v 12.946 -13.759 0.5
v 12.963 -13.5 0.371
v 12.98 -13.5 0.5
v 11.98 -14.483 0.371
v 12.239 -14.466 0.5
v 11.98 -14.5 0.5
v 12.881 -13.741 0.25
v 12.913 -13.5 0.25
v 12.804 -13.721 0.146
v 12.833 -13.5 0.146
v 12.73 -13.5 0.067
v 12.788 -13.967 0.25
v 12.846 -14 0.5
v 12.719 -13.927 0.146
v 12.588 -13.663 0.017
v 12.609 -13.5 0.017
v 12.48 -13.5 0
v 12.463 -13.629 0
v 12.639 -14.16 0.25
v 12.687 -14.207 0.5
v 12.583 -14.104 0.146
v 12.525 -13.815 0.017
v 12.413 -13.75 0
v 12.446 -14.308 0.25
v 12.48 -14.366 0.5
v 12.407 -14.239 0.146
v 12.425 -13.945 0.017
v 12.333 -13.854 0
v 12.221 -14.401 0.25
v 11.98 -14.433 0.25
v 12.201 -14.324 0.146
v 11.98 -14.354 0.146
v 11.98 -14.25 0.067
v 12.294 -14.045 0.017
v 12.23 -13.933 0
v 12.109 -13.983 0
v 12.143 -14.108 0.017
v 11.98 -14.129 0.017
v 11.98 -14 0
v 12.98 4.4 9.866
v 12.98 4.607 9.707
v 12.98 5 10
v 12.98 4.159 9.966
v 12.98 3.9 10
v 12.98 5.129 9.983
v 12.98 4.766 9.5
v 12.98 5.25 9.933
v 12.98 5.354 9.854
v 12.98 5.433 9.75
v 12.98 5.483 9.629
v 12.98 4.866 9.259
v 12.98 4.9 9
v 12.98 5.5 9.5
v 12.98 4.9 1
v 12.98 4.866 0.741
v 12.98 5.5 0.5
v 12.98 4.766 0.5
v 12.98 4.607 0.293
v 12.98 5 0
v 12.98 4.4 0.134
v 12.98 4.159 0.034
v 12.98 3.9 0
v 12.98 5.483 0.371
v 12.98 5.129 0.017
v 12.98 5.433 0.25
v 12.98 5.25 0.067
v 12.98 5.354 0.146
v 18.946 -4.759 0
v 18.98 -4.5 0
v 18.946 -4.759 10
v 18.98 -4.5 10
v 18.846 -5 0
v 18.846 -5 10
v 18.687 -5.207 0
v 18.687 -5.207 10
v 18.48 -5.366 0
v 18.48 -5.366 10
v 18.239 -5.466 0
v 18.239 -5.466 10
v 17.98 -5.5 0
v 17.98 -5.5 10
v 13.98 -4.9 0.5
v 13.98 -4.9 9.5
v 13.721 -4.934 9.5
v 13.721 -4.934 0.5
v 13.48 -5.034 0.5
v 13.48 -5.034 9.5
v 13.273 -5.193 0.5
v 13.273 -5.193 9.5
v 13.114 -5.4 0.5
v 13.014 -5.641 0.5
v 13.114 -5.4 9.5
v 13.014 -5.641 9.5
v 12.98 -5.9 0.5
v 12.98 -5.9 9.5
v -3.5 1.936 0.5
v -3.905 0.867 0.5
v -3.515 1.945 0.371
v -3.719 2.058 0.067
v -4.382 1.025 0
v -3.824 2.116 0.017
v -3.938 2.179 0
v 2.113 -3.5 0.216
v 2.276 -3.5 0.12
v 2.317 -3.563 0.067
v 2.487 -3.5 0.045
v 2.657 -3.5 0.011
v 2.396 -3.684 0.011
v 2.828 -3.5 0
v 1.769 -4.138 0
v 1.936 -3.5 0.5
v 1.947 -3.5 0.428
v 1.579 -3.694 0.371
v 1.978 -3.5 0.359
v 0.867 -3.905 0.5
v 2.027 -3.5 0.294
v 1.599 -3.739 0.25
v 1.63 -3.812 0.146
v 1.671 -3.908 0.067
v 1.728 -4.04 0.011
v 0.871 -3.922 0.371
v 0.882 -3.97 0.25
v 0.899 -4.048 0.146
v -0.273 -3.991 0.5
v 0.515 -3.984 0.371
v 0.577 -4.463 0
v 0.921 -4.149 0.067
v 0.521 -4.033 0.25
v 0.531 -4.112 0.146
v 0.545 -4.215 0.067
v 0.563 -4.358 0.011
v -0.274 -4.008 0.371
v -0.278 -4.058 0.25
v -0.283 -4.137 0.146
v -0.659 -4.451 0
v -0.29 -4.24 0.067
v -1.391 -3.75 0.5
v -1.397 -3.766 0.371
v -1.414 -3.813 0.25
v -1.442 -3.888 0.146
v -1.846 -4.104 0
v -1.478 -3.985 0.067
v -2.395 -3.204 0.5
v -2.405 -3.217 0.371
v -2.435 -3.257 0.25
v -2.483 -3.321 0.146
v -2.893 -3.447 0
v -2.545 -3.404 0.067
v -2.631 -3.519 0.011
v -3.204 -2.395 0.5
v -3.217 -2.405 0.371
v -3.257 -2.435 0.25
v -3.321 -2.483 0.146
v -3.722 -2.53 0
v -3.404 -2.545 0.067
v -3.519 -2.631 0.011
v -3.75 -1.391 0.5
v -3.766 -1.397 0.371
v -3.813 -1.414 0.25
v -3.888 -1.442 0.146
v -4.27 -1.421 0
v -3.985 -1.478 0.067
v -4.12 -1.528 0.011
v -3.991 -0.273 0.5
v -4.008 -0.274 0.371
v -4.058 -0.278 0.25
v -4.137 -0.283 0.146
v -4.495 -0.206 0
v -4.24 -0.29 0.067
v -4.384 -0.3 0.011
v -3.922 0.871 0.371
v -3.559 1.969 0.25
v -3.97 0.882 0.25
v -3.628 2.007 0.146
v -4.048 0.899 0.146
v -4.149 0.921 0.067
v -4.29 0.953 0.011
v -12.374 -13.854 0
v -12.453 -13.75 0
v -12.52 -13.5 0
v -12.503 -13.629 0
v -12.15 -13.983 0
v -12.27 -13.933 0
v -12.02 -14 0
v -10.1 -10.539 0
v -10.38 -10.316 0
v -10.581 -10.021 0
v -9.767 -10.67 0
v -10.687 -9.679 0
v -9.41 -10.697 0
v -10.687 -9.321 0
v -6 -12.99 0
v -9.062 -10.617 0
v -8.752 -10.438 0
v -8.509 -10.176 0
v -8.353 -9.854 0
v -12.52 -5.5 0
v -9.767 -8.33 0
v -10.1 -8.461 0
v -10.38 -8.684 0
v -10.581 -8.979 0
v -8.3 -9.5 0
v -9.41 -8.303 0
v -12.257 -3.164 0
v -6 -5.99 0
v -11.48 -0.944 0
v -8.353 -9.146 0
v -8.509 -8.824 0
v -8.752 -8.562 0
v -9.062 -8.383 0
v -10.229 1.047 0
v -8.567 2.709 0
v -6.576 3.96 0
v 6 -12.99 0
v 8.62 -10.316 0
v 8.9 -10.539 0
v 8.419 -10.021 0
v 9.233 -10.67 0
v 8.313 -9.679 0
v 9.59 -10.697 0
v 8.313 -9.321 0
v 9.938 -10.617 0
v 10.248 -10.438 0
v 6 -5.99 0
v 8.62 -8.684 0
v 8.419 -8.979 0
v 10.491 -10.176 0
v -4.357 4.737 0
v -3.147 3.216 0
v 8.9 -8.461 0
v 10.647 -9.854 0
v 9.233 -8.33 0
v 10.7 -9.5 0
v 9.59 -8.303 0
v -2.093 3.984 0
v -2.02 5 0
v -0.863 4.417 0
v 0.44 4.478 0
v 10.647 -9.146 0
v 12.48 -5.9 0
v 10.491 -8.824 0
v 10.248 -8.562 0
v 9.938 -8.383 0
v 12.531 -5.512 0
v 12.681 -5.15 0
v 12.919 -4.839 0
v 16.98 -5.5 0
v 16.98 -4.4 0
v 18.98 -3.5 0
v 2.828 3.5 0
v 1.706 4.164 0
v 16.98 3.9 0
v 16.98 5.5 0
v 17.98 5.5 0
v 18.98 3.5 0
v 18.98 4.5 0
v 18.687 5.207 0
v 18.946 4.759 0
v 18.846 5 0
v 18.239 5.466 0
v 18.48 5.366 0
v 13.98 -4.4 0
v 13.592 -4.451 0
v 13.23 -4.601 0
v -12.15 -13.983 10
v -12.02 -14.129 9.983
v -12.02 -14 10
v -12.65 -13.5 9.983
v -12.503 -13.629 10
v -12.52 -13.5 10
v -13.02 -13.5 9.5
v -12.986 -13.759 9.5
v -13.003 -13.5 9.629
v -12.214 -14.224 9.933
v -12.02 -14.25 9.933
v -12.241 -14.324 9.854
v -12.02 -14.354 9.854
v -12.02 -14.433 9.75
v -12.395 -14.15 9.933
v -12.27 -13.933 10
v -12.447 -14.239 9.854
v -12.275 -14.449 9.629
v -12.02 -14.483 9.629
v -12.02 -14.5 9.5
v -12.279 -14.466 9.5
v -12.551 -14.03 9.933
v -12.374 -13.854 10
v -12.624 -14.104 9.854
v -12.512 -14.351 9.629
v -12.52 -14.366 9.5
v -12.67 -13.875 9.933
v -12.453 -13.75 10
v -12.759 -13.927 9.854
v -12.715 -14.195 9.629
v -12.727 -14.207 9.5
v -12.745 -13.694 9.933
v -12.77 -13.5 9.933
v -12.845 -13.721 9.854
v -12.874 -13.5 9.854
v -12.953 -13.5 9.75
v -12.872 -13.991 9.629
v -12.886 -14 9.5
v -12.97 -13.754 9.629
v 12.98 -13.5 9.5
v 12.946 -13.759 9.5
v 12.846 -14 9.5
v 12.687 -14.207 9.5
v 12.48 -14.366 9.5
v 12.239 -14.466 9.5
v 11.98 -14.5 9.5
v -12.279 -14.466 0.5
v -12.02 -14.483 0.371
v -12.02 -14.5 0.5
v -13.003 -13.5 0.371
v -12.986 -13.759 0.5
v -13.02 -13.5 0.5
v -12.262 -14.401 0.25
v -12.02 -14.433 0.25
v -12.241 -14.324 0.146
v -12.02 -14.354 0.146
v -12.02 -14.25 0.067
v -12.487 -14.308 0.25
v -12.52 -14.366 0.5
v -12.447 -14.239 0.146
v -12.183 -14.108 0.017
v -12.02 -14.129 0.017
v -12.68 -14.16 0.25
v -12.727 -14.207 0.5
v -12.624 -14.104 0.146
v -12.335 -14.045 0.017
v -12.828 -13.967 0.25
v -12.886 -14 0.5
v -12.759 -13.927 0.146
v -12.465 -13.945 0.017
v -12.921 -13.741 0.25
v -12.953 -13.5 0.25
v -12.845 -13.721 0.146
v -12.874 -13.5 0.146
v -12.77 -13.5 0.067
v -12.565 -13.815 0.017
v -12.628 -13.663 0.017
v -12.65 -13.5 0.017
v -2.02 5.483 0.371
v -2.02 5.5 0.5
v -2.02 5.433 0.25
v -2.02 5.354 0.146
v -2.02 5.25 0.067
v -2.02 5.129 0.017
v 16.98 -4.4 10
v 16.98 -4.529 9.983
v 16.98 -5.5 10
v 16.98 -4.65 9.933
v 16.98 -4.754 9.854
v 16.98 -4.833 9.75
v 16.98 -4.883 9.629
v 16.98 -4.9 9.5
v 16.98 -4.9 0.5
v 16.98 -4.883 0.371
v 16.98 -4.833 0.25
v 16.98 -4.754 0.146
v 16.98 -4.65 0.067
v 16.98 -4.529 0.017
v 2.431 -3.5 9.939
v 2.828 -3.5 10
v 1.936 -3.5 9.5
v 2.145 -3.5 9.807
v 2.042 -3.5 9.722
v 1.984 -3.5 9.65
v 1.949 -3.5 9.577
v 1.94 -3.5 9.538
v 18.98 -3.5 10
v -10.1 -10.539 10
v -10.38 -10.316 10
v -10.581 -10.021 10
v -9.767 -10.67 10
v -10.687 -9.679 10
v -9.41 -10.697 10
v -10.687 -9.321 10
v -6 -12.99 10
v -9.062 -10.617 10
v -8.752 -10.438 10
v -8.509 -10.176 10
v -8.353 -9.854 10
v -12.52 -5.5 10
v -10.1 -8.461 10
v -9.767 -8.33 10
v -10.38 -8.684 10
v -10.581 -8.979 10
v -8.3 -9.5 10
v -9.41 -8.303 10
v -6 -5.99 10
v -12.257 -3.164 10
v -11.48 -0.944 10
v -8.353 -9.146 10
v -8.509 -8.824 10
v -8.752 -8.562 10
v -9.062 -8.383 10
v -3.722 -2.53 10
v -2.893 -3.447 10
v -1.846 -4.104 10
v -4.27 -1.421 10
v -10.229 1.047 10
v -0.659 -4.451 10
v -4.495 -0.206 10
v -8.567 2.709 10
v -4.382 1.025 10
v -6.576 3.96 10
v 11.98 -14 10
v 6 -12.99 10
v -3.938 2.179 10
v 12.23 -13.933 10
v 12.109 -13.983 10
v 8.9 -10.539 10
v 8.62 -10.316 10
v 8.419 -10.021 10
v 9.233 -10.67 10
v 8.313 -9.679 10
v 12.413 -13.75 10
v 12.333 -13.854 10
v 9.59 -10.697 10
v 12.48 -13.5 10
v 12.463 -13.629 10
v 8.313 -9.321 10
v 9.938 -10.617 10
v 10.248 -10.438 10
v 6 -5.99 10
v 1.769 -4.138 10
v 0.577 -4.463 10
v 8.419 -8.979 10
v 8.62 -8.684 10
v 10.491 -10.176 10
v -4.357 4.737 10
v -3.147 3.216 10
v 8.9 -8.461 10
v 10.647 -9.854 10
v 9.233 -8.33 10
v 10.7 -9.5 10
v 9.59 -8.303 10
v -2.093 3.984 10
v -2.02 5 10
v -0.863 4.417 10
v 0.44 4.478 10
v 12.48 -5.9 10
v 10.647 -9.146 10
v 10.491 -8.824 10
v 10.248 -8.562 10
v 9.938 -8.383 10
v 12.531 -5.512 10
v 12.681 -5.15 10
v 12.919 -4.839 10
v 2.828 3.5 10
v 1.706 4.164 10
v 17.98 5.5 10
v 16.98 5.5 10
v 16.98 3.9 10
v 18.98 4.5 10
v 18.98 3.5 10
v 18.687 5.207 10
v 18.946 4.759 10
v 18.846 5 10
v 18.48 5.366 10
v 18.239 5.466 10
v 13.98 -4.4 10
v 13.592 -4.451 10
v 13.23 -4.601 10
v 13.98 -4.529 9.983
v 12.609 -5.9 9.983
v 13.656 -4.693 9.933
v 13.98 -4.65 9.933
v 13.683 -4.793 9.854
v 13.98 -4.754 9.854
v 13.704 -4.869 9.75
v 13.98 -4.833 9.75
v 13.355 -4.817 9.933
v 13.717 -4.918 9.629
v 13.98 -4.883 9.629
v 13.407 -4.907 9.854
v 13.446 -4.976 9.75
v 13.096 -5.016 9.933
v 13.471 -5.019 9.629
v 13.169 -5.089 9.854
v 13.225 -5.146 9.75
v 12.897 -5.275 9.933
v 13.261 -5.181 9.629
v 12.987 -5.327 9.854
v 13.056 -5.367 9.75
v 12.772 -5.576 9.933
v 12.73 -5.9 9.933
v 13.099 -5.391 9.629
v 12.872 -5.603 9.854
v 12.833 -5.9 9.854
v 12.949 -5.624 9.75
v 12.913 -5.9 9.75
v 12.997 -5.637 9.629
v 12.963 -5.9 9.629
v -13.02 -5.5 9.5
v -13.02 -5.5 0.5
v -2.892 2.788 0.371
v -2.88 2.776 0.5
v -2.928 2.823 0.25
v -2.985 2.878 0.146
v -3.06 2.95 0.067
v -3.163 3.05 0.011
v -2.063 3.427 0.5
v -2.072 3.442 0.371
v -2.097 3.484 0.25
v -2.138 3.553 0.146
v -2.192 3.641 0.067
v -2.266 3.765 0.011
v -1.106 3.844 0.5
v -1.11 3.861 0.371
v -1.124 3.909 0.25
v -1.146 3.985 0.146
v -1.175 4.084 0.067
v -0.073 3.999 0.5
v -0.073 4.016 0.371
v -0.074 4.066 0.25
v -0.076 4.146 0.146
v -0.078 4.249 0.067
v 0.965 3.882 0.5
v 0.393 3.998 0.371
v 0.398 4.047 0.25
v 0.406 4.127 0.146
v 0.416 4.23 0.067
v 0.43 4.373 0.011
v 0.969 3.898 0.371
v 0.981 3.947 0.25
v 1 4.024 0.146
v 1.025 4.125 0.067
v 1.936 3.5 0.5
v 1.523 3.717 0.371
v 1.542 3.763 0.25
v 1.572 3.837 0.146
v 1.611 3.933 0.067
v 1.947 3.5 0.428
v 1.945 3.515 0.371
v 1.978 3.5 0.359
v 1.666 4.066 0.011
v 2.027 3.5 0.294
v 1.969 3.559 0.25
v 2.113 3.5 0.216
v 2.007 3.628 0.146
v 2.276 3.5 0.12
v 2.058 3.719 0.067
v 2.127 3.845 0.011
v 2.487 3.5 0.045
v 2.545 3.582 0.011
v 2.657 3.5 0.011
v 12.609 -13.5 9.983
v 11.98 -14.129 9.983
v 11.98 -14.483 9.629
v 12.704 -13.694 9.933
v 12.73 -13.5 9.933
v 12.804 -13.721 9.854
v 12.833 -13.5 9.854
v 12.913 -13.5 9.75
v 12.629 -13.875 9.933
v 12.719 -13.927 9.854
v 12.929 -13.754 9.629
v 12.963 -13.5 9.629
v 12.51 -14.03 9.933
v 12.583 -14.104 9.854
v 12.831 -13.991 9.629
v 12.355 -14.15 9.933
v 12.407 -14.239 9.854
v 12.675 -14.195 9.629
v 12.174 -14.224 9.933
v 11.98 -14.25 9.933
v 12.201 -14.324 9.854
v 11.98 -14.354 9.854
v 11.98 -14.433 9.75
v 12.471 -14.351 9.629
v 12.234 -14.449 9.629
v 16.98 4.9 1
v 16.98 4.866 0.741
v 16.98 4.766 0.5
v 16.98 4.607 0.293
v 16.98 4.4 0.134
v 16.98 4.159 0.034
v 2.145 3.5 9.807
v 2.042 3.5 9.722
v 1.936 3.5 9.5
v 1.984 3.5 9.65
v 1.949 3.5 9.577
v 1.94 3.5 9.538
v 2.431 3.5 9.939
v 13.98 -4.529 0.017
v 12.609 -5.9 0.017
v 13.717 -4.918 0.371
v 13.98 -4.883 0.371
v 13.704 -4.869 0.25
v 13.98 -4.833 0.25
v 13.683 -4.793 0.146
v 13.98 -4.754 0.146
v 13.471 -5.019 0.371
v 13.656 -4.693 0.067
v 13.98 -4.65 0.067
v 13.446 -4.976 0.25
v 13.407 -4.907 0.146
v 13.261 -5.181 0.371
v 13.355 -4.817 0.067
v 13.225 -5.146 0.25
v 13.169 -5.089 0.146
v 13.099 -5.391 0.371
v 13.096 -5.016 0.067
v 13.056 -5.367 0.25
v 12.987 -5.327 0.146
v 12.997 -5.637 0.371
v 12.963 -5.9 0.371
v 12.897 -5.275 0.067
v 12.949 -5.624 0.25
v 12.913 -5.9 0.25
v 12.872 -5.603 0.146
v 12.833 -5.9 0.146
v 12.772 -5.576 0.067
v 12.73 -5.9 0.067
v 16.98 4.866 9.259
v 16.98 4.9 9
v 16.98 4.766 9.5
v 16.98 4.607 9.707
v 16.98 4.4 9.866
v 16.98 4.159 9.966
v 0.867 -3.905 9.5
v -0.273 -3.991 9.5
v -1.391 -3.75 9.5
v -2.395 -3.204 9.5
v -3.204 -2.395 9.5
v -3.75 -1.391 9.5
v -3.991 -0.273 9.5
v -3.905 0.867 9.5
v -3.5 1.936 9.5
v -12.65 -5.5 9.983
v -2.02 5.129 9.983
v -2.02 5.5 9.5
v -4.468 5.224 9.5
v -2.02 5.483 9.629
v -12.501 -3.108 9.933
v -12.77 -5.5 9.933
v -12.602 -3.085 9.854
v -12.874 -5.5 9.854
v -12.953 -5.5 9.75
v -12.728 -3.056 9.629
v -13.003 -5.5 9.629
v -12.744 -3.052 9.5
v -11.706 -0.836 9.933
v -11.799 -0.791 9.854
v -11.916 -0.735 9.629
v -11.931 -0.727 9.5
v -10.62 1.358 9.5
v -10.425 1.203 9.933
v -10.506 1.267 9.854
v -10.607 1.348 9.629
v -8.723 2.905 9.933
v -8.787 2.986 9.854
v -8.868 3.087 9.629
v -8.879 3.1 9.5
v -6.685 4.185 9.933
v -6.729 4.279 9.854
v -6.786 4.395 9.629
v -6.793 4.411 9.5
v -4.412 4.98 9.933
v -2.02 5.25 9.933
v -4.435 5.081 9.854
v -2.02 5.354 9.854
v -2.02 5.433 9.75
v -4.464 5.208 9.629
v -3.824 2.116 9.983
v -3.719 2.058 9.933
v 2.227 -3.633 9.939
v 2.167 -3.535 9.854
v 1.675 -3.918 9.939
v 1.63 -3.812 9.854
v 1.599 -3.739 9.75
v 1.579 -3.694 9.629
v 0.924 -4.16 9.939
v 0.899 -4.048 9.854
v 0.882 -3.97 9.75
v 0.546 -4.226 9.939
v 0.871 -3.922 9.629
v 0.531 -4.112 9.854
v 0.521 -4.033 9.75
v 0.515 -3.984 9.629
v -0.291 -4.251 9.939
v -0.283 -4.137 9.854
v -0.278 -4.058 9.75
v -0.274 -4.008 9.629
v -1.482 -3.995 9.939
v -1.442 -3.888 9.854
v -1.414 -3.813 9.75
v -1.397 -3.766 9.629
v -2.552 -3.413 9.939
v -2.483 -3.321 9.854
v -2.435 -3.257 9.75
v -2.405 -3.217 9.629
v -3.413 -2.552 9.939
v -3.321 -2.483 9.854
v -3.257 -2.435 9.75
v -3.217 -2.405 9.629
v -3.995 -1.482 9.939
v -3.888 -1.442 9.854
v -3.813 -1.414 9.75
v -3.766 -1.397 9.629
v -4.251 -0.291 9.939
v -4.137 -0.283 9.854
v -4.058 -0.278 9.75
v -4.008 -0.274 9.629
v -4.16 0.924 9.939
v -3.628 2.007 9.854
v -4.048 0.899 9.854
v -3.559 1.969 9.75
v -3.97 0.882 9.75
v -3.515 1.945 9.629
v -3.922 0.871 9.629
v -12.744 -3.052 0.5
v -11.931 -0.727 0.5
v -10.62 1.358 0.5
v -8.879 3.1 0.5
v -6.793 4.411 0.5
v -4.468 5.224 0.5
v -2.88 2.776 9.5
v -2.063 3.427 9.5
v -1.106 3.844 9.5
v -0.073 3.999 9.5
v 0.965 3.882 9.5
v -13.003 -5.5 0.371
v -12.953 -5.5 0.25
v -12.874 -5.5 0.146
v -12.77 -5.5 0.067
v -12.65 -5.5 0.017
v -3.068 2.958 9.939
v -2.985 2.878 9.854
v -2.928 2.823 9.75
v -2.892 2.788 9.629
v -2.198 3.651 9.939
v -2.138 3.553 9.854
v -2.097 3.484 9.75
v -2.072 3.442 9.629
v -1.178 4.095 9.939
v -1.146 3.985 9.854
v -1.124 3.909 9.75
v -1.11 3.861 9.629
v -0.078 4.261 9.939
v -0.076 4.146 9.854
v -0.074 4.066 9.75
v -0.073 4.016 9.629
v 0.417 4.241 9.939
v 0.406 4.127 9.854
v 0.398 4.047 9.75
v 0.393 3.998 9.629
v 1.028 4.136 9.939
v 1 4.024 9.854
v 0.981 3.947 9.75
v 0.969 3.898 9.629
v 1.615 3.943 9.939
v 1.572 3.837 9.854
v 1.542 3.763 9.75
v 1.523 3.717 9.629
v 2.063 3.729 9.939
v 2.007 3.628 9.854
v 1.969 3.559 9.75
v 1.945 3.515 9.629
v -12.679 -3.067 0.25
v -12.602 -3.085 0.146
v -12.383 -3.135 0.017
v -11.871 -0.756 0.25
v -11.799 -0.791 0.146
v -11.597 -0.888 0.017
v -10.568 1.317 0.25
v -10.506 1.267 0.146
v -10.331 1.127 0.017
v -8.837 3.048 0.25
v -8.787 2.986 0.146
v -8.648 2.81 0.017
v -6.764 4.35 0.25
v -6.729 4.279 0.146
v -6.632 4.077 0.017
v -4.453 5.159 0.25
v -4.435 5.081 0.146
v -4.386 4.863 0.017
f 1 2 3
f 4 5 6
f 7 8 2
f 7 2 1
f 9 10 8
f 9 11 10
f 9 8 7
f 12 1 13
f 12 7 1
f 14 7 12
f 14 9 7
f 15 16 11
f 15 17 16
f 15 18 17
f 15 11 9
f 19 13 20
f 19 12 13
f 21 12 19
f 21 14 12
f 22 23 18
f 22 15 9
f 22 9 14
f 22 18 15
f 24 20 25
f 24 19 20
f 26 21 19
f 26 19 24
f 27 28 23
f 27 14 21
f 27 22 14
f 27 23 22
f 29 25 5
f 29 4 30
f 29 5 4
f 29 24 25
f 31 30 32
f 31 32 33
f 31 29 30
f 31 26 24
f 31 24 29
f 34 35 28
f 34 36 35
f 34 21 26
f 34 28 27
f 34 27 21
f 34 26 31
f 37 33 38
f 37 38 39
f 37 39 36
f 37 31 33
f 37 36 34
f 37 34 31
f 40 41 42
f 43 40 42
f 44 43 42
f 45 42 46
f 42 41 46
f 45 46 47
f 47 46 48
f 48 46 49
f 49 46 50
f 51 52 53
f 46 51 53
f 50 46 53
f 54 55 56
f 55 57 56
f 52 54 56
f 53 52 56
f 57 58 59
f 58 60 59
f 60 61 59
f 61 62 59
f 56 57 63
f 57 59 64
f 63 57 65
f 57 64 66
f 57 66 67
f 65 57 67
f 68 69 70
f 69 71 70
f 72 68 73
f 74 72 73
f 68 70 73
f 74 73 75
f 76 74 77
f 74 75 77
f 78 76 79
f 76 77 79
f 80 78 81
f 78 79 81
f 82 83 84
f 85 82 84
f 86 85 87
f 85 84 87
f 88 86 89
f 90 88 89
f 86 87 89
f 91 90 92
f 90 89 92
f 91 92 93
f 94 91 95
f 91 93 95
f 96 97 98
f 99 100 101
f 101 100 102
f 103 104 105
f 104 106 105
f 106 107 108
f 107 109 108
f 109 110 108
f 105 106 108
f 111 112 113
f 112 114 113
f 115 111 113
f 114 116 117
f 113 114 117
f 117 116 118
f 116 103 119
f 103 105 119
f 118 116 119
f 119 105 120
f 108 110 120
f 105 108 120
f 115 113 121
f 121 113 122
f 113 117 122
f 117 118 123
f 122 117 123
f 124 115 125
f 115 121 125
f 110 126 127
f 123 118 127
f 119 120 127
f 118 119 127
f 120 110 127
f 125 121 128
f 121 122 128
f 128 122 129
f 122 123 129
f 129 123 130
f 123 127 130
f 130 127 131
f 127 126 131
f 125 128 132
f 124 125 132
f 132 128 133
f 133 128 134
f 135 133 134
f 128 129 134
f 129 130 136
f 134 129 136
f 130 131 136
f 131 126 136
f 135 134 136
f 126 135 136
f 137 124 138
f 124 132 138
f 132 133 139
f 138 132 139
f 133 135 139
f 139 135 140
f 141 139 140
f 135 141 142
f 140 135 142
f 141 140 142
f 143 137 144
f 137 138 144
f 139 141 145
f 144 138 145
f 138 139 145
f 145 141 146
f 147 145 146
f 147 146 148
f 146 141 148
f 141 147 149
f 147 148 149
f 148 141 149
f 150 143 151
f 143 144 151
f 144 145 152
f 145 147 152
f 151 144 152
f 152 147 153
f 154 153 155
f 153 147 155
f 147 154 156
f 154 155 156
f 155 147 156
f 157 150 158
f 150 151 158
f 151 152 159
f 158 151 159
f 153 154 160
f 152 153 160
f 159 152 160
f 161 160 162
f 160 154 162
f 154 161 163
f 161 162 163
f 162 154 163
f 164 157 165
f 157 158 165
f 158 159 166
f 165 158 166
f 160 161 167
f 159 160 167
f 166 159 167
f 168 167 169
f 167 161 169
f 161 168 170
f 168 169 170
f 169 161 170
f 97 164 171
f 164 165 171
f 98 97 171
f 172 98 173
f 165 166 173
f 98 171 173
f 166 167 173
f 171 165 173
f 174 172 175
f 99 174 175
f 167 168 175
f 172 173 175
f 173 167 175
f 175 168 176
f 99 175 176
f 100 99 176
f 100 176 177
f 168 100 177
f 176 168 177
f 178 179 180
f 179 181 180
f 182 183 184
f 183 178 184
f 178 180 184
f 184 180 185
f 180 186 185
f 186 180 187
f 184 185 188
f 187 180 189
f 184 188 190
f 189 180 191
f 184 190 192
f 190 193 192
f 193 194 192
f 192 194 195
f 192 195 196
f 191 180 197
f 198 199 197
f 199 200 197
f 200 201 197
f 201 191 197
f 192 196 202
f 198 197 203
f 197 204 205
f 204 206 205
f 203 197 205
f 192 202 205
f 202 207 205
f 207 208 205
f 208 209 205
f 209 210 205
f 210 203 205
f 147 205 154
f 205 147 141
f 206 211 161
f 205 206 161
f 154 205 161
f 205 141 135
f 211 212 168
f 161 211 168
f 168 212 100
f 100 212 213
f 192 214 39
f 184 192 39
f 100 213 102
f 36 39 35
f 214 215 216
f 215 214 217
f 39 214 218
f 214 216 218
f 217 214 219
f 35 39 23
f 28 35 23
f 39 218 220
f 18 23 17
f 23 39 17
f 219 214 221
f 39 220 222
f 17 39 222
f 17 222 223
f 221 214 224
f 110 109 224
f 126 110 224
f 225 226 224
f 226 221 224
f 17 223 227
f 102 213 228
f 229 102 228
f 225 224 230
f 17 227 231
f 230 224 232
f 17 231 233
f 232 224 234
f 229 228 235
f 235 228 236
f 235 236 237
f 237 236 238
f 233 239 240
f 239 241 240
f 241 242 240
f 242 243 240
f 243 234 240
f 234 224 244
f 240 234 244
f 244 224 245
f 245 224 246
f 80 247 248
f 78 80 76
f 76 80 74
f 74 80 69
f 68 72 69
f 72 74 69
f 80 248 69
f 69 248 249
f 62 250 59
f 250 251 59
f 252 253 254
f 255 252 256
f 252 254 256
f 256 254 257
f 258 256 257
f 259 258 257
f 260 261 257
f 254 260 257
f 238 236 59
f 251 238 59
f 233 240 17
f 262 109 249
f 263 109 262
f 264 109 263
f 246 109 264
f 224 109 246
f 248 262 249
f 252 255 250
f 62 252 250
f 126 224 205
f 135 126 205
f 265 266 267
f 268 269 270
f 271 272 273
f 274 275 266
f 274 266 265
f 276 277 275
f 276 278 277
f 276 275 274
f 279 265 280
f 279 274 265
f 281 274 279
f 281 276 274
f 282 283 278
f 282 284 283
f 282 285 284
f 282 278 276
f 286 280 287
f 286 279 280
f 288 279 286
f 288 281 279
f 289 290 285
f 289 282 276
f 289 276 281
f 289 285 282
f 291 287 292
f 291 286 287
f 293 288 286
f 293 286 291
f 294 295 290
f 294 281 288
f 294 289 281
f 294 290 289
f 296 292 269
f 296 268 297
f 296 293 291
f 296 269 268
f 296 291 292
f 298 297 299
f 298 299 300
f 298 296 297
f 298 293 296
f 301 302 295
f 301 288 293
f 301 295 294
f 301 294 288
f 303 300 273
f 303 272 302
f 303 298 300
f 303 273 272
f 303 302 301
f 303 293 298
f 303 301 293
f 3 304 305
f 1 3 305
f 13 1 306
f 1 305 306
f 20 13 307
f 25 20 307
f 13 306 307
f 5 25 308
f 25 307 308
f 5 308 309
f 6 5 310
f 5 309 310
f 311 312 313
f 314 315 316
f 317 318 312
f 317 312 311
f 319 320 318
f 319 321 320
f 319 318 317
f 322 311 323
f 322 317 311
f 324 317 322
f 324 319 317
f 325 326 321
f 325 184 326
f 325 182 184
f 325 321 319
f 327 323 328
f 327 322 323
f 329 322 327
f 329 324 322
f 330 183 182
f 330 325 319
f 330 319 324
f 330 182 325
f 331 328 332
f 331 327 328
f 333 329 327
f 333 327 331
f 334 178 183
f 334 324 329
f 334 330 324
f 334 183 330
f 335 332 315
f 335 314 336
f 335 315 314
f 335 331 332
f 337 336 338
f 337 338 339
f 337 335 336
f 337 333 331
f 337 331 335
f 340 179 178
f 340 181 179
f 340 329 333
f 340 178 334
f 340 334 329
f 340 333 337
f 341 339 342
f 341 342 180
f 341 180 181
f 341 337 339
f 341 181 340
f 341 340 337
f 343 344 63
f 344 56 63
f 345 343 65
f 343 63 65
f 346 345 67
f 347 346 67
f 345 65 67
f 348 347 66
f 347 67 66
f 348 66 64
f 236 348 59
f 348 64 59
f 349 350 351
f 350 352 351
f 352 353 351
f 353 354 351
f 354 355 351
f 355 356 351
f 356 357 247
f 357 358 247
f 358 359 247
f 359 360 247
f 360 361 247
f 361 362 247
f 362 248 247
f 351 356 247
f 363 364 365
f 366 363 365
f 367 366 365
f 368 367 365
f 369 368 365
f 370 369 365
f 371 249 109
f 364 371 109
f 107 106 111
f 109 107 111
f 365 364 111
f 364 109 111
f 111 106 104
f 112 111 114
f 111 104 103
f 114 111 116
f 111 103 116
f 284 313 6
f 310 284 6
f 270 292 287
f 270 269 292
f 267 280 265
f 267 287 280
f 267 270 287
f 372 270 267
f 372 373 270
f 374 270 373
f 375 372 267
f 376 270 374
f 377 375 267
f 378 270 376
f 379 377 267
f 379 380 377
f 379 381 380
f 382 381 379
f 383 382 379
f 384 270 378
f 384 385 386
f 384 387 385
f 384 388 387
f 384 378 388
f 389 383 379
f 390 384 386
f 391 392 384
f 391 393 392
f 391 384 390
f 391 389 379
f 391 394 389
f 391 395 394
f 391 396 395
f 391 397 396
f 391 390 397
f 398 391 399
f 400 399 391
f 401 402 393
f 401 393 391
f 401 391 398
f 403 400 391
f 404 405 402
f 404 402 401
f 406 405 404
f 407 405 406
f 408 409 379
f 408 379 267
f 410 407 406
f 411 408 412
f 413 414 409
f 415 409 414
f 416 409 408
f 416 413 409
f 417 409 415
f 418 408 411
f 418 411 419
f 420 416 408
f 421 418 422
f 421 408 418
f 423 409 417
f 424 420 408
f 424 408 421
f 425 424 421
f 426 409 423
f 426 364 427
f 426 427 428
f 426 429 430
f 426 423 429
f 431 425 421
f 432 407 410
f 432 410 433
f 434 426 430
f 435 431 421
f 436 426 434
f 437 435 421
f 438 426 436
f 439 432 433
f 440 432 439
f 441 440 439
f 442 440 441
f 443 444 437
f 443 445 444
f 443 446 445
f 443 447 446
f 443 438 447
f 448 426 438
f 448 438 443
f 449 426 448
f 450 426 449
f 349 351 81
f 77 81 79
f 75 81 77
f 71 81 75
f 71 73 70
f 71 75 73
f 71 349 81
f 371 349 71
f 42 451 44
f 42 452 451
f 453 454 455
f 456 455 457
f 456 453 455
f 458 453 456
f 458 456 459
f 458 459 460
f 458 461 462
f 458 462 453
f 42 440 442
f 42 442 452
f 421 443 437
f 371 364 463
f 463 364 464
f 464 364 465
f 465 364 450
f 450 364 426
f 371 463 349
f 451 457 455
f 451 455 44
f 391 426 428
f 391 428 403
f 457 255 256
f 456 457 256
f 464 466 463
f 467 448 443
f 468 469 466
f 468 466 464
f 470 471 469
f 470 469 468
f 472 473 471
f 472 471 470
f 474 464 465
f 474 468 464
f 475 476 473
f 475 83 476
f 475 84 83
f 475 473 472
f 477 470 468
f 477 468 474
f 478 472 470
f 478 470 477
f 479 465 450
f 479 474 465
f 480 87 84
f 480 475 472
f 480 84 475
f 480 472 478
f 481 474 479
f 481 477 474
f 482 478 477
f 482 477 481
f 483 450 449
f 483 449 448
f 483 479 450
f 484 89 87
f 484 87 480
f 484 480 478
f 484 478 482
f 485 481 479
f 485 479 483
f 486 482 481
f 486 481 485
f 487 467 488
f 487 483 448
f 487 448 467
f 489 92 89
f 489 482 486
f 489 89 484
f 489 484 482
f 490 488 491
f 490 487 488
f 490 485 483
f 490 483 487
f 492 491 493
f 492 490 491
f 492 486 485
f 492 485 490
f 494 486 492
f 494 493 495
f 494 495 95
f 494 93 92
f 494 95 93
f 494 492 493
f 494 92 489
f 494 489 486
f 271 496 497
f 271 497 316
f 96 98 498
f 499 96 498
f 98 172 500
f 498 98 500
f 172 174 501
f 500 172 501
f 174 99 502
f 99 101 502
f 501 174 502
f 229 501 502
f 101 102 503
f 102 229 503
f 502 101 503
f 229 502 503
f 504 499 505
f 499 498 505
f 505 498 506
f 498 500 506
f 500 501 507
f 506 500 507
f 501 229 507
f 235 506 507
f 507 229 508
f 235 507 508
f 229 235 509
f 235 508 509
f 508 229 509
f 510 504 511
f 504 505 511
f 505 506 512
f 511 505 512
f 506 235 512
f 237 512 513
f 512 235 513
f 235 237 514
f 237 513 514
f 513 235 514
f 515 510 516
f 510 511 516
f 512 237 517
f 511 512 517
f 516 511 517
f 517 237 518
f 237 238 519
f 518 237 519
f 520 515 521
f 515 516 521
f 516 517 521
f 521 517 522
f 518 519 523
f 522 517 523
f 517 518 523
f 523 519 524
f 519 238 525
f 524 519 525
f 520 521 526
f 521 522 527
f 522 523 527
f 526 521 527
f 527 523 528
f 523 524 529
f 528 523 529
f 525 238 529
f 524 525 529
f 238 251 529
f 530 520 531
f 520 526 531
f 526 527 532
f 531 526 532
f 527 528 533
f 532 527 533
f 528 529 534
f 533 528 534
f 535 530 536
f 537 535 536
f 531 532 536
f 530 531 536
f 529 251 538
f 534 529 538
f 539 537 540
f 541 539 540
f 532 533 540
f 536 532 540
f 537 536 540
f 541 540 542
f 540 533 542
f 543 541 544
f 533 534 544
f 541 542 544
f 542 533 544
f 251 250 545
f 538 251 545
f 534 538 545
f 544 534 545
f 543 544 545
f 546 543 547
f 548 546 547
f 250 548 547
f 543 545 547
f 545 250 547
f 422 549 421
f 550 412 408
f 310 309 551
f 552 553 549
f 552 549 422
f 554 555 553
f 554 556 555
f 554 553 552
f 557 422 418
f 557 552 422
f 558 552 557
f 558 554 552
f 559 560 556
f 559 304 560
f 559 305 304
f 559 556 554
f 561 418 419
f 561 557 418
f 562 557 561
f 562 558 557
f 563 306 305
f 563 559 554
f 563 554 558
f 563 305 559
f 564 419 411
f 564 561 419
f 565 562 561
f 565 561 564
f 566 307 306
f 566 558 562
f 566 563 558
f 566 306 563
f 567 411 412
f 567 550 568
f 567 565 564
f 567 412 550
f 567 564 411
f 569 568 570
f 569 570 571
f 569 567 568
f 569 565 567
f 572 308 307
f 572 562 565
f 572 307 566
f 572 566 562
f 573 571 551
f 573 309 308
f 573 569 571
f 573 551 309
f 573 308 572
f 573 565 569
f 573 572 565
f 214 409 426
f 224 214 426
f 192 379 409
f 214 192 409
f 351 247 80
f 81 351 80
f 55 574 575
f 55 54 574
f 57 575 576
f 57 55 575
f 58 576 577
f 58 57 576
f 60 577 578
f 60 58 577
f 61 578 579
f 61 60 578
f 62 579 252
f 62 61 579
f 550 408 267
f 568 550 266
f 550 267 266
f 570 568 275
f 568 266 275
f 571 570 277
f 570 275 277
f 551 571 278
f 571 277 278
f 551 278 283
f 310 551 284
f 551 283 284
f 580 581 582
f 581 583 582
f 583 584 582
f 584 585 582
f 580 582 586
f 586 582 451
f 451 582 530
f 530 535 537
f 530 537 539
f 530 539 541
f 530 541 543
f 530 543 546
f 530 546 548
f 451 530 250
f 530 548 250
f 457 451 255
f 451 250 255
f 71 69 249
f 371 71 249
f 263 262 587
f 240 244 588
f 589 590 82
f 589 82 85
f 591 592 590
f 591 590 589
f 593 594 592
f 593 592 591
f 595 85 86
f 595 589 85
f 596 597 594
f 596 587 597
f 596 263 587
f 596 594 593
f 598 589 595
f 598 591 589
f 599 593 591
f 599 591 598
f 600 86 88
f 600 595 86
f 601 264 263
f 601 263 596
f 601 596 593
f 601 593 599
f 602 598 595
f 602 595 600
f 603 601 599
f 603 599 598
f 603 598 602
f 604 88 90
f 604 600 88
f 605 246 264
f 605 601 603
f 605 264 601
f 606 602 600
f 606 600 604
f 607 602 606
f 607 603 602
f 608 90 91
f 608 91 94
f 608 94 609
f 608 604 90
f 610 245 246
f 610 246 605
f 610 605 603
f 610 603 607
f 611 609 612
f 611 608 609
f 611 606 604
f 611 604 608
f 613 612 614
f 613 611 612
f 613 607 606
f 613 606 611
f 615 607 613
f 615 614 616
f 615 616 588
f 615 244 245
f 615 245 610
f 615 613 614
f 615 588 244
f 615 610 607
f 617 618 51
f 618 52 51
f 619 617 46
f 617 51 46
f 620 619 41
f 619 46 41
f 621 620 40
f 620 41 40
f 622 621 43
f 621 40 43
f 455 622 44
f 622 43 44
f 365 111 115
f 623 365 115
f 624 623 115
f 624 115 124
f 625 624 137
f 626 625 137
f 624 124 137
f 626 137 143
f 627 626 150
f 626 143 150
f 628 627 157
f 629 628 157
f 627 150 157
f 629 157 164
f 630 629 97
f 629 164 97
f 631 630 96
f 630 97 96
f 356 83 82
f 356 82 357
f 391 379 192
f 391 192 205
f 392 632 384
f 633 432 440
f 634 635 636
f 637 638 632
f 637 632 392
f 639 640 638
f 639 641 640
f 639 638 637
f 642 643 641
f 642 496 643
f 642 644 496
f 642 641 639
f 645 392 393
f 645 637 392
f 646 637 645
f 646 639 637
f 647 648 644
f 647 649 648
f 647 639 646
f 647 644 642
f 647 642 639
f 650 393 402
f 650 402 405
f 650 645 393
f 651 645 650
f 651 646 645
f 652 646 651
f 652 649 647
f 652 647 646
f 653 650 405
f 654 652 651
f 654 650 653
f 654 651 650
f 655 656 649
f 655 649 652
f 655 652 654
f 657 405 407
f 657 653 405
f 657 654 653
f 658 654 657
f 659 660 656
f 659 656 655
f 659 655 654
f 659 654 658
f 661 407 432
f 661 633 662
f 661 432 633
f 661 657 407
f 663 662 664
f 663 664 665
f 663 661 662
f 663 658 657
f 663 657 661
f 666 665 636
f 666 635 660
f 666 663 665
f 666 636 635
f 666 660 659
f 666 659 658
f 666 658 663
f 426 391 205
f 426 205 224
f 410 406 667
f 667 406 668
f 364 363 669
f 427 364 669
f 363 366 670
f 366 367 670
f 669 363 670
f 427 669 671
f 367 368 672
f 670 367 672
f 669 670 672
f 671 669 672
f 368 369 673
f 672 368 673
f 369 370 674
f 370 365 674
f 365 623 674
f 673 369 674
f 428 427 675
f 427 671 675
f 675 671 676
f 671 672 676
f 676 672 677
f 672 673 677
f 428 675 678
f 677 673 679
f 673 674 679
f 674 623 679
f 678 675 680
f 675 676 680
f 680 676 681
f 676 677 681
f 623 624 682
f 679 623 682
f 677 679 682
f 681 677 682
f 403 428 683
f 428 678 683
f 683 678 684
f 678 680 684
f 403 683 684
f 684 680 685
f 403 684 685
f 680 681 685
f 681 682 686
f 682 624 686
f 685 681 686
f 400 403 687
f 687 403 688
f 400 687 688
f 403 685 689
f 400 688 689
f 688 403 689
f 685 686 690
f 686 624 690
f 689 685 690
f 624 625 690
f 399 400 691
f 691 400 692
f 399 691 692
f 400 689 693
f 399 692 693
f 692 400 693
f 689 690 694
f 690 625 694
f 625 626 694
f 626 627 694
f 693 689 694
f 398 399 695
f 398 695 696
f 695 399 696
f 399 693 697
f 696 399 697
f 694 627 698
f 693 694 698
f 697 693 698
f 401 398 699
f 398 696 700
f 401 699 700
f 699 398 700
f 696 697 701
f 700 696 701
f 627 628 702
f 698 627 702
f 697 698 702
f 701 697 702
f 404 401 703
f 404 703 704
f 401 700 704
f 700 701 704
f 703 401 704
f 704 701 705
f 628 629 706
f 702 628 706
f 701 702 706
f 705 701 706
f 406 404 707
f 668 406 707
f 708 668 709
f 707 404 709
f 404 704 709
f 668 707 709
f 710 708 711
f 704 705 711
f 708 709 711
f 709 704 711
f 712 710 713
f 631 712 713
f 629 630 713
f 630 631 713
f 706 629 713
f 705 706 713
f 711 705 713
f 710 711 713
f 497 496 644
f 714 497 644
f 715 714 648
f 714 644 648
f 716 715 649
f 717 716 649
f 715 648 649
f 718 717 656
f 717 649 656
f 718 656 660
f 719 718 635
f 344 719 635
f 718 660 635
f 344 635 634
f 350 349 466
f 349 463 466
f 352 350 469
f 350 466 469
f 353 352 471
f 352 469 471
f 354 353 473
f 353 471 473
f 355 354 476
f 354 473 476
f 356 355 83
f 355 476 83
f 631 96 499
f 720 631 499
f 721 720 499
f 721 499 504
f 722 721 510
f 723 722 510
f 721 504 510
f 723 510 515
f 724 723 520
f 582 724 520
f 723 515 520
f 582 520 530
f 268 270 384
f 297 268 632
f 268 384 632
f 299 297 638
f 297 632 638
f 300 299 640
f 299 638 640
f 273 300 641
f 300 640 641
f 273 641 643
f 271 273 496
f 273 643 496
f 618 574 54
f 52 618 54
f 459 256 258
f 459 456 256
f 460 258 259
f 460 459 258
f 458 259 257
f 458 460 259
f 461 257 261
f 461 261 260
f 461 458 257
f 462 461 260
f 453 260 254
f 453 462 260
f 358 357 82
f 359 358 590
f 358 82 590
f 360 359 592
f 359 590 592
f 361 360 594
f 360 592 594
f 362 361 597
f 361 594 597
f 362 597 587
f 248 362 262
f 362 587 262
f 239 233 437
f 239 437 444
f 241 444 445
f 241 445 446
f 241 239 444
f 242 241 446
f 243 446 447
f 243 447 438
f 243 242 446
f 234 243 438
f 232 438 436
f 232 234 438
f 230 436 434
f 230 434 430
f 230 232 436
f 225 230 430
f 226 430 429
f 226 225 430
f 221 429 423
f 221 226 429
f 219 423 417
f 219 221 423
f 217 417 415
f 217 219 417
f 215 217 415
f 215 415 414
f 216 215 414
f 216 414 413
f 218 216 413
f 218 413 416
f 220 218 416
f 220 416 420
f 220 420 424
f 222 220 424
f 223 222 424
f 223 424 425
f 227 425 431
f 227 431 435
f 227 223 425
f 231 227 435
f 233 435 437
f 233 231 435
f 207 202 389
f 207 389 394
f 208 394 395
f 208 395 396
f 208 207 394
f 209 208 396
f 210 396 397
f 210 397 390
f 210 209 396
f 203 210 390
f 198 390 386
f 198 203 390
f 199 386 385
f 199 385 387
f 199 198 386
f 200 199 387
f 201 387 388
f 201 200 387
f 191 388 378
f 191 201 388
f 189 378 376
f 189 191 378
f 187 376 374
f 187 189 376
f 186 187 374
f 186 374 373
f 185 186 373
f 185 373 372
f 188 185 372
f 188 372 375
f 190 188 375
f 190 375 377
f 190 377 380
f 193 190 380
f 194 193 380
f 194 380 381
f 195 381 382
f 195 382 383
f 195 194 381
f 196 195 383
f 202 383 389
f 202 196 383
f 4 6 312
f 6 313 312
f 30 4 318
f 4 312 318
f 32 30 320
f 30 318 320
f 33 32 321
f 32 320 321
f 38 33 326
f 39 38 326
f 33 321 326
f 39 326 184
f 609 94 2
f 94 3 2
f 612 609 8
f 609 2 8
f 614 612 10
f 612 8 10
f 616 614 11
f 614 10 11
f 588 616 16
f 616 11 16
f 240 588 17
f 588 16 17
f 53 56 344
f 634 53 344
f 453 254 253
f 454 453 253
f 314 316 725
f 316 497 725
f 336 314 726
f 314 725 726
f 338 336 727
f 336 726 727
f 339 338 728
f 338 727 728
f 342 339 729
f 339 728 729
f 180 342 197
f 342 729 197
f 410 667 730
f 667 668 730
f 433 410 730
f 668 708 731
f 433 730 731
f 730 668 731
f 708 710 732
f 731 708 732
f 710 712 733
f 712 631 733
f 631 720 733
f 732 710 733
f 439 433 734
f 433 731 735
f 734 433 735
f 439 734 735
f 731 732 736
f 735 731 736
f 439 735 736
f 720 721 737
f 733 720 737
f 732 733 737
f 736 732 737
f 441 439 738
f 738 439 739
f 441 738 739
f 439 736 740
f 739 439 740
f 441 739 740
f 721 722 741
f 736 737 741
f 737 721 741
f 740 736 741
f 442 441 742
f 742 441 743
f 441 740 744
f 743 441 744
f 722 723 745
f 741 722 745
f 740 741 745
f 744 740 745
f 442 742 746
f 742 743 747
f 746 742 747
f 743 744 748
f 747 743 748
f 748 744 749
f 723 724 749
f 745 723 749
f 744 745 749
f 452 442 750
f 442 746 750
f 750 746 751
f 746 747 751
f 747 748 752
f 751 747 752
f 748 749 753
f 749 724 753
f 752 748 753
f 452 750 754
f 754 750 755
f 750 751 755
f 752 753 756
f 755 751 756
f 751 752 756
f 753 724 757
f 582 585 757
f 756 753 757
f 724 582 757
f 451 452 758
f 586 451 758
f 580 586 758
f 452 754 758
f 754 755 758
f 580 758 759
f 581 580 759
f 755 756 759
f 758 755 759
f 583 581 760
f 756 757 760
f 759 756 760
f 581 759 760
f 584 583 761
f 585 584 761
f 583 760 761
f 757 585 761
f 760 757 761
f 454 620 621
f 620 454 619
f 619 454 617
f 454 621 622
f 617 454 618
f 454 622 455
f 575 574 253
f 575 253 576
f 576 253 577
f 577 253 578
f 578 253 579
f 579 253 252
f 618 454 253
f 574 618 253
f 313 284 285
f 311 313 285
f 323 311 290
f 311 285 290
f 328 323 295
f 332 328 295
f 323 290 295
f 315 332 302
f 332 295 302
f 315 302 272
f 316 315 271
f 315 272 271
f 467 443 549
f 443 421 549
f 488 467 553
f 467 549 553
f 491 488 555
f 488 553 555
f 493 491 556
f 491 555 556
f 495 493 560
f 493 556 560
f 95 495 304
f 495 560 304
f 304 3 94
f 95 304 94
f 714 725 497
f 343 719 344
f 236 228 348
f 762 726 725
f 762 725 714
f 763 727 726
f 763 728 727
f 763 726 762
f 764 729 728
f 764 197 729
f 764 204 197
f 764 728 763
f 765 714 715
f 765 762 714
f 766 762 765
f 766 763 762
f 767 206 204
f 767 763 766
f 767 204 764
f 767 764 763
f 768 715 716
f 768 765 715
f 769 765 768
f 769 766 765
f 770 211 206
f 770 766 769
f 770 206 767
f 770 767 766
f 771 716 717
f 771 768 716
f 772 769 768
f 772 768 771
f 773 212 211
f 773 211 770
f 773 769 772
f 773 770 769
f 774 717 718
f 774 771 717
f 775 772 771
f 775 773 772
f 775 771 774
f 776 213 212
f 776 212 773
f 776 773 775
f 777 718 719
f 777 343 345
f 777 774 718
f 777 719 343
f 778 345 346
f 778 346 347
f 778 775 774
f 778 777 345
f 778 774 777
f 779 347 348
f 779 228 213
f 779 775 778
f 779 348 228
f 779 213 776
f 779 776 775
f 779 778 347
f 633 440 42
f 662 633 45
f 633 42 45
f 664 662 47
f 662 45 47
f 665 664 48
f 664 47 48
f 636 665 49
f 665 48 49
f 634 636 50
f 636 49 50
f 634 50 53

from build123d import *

# Parameters (mm, degrees)
F0_R     = 1.2
F1_DEPTH = 10
F2_R     = 1
F3_R     = 11
F4_W     = 12
F4_H     = 7
F5_DEPTH = 10
F6_R     = 0.5


with BuildPart() as f1:
    # F0 (on Top) → F1 (new body)
    with BuildSketch(Plane.XY):
        with BuildLine():
            ThreePointArc((1.9364916731, -3.5), (-2.8284271247, -2.8284271247), (-3.5, 1.9364916731))
            ThreePointArc((-3.5, 1.9364916731), (-1.1055673404, 3.8441801279), (1.9364916731, 3.5))
            Line((1.9364916731, 3.5), (18.9797490537, 3.5))
            Line((18.9797490537, 3.5), (18.9797490537, 5.5))
            Line((18.9797490537, 5.5), (16.9797490537, 5.5))
            Line((16.9797490537, 5.5), (16.9797490537, 4.9))
            Line((16.9797490537, 4.9), (12.9797490537, 4.9))
            Line((12.9797490537, 4.9), (12.9797490537, 5.5))
            Line((12.9797490537, 5.5), (-13.0202509463, 5.5))
            Line((-13.0202509463, 5.5), (-13.0202509463, -4.5))
            Line((-13.0202509463, -4.5), (-13.0202509463, -14.5))
            Line((-13.0202509463, -14.5), (12.9797490537, -14.5))
            Line((12.9797490537, -14.5), (12.9797490537, -5.5))
            Line((12.9797490537, -5.5), (12.9797490537, -4.9))
            Line((12.9797490537, -4.9), (16.9797490537, -4.9))
            Line((16.9797490537, -4.9), (16.9797490537, -5.5))
            Line((16.9797490537, -5.5), (18.9797490537, -5.5))
            Line((18.9797490537, -5.5), (18.9797490537, -3.5))
            Line((18.9797490537, -3.5), (12.9797490537, -3.5))
            Line((12.9797490537, -3.5), (1.9364916731, -3.5))
        make_face()
        with Locations((-9.5, -9.5)):
            Circle(F0_R, mode=Mode.SUBTRACT)
        with Locations((9.5, -9.5)):
            Circle(F0_R, mode=Mode.SUBTRACT)
    extrude(amount=F1_DEPTH)

    # F2
    f2_edges = [f1.edges().sort_by_distance(p)[0] for p in [
        (18.979749, 5.5, 5),
        (18.979749, -5.5, 5),
        (14.979749, 4.9, 10),
        (14.979749, 4.9, 0),
        (12.979749, -4.9, 5),
        (12.979749, -14.5, 5),
        (-13.020251, -14.5, 5),
    ]]
    fillet(f2_edges, radius=F2_R)

    # F3
    f3_edges = [f1.edges().sort_by_distance(p)[0] for p in [
        (-13.020251, 5.5, 5),
    ]]
    fillet(f3_edges, radius=F3_R)

    # F4 (on face) → F5 (cut)
    with BuildSketch(Plane.XY.offset(10)):
        with Locations((0, -9.4900932163)):
            Rectangle(F4_W, F4_H)
    extrude(amount=-F5_DEPTH, mode=Mode.SUBTRACT)

    # F6
    f6_edges = [f1.edges().sort_by_distance(p)[0] for p in [
        (-9.798426, 2.278175, 10),
        (-9.798426, 2.278175, 0),
        (-4, 0, 0),
        (-4, 0, 10),
    ]]
    fillet(f6_edges, radius=F6_R)


solid = f1.part
